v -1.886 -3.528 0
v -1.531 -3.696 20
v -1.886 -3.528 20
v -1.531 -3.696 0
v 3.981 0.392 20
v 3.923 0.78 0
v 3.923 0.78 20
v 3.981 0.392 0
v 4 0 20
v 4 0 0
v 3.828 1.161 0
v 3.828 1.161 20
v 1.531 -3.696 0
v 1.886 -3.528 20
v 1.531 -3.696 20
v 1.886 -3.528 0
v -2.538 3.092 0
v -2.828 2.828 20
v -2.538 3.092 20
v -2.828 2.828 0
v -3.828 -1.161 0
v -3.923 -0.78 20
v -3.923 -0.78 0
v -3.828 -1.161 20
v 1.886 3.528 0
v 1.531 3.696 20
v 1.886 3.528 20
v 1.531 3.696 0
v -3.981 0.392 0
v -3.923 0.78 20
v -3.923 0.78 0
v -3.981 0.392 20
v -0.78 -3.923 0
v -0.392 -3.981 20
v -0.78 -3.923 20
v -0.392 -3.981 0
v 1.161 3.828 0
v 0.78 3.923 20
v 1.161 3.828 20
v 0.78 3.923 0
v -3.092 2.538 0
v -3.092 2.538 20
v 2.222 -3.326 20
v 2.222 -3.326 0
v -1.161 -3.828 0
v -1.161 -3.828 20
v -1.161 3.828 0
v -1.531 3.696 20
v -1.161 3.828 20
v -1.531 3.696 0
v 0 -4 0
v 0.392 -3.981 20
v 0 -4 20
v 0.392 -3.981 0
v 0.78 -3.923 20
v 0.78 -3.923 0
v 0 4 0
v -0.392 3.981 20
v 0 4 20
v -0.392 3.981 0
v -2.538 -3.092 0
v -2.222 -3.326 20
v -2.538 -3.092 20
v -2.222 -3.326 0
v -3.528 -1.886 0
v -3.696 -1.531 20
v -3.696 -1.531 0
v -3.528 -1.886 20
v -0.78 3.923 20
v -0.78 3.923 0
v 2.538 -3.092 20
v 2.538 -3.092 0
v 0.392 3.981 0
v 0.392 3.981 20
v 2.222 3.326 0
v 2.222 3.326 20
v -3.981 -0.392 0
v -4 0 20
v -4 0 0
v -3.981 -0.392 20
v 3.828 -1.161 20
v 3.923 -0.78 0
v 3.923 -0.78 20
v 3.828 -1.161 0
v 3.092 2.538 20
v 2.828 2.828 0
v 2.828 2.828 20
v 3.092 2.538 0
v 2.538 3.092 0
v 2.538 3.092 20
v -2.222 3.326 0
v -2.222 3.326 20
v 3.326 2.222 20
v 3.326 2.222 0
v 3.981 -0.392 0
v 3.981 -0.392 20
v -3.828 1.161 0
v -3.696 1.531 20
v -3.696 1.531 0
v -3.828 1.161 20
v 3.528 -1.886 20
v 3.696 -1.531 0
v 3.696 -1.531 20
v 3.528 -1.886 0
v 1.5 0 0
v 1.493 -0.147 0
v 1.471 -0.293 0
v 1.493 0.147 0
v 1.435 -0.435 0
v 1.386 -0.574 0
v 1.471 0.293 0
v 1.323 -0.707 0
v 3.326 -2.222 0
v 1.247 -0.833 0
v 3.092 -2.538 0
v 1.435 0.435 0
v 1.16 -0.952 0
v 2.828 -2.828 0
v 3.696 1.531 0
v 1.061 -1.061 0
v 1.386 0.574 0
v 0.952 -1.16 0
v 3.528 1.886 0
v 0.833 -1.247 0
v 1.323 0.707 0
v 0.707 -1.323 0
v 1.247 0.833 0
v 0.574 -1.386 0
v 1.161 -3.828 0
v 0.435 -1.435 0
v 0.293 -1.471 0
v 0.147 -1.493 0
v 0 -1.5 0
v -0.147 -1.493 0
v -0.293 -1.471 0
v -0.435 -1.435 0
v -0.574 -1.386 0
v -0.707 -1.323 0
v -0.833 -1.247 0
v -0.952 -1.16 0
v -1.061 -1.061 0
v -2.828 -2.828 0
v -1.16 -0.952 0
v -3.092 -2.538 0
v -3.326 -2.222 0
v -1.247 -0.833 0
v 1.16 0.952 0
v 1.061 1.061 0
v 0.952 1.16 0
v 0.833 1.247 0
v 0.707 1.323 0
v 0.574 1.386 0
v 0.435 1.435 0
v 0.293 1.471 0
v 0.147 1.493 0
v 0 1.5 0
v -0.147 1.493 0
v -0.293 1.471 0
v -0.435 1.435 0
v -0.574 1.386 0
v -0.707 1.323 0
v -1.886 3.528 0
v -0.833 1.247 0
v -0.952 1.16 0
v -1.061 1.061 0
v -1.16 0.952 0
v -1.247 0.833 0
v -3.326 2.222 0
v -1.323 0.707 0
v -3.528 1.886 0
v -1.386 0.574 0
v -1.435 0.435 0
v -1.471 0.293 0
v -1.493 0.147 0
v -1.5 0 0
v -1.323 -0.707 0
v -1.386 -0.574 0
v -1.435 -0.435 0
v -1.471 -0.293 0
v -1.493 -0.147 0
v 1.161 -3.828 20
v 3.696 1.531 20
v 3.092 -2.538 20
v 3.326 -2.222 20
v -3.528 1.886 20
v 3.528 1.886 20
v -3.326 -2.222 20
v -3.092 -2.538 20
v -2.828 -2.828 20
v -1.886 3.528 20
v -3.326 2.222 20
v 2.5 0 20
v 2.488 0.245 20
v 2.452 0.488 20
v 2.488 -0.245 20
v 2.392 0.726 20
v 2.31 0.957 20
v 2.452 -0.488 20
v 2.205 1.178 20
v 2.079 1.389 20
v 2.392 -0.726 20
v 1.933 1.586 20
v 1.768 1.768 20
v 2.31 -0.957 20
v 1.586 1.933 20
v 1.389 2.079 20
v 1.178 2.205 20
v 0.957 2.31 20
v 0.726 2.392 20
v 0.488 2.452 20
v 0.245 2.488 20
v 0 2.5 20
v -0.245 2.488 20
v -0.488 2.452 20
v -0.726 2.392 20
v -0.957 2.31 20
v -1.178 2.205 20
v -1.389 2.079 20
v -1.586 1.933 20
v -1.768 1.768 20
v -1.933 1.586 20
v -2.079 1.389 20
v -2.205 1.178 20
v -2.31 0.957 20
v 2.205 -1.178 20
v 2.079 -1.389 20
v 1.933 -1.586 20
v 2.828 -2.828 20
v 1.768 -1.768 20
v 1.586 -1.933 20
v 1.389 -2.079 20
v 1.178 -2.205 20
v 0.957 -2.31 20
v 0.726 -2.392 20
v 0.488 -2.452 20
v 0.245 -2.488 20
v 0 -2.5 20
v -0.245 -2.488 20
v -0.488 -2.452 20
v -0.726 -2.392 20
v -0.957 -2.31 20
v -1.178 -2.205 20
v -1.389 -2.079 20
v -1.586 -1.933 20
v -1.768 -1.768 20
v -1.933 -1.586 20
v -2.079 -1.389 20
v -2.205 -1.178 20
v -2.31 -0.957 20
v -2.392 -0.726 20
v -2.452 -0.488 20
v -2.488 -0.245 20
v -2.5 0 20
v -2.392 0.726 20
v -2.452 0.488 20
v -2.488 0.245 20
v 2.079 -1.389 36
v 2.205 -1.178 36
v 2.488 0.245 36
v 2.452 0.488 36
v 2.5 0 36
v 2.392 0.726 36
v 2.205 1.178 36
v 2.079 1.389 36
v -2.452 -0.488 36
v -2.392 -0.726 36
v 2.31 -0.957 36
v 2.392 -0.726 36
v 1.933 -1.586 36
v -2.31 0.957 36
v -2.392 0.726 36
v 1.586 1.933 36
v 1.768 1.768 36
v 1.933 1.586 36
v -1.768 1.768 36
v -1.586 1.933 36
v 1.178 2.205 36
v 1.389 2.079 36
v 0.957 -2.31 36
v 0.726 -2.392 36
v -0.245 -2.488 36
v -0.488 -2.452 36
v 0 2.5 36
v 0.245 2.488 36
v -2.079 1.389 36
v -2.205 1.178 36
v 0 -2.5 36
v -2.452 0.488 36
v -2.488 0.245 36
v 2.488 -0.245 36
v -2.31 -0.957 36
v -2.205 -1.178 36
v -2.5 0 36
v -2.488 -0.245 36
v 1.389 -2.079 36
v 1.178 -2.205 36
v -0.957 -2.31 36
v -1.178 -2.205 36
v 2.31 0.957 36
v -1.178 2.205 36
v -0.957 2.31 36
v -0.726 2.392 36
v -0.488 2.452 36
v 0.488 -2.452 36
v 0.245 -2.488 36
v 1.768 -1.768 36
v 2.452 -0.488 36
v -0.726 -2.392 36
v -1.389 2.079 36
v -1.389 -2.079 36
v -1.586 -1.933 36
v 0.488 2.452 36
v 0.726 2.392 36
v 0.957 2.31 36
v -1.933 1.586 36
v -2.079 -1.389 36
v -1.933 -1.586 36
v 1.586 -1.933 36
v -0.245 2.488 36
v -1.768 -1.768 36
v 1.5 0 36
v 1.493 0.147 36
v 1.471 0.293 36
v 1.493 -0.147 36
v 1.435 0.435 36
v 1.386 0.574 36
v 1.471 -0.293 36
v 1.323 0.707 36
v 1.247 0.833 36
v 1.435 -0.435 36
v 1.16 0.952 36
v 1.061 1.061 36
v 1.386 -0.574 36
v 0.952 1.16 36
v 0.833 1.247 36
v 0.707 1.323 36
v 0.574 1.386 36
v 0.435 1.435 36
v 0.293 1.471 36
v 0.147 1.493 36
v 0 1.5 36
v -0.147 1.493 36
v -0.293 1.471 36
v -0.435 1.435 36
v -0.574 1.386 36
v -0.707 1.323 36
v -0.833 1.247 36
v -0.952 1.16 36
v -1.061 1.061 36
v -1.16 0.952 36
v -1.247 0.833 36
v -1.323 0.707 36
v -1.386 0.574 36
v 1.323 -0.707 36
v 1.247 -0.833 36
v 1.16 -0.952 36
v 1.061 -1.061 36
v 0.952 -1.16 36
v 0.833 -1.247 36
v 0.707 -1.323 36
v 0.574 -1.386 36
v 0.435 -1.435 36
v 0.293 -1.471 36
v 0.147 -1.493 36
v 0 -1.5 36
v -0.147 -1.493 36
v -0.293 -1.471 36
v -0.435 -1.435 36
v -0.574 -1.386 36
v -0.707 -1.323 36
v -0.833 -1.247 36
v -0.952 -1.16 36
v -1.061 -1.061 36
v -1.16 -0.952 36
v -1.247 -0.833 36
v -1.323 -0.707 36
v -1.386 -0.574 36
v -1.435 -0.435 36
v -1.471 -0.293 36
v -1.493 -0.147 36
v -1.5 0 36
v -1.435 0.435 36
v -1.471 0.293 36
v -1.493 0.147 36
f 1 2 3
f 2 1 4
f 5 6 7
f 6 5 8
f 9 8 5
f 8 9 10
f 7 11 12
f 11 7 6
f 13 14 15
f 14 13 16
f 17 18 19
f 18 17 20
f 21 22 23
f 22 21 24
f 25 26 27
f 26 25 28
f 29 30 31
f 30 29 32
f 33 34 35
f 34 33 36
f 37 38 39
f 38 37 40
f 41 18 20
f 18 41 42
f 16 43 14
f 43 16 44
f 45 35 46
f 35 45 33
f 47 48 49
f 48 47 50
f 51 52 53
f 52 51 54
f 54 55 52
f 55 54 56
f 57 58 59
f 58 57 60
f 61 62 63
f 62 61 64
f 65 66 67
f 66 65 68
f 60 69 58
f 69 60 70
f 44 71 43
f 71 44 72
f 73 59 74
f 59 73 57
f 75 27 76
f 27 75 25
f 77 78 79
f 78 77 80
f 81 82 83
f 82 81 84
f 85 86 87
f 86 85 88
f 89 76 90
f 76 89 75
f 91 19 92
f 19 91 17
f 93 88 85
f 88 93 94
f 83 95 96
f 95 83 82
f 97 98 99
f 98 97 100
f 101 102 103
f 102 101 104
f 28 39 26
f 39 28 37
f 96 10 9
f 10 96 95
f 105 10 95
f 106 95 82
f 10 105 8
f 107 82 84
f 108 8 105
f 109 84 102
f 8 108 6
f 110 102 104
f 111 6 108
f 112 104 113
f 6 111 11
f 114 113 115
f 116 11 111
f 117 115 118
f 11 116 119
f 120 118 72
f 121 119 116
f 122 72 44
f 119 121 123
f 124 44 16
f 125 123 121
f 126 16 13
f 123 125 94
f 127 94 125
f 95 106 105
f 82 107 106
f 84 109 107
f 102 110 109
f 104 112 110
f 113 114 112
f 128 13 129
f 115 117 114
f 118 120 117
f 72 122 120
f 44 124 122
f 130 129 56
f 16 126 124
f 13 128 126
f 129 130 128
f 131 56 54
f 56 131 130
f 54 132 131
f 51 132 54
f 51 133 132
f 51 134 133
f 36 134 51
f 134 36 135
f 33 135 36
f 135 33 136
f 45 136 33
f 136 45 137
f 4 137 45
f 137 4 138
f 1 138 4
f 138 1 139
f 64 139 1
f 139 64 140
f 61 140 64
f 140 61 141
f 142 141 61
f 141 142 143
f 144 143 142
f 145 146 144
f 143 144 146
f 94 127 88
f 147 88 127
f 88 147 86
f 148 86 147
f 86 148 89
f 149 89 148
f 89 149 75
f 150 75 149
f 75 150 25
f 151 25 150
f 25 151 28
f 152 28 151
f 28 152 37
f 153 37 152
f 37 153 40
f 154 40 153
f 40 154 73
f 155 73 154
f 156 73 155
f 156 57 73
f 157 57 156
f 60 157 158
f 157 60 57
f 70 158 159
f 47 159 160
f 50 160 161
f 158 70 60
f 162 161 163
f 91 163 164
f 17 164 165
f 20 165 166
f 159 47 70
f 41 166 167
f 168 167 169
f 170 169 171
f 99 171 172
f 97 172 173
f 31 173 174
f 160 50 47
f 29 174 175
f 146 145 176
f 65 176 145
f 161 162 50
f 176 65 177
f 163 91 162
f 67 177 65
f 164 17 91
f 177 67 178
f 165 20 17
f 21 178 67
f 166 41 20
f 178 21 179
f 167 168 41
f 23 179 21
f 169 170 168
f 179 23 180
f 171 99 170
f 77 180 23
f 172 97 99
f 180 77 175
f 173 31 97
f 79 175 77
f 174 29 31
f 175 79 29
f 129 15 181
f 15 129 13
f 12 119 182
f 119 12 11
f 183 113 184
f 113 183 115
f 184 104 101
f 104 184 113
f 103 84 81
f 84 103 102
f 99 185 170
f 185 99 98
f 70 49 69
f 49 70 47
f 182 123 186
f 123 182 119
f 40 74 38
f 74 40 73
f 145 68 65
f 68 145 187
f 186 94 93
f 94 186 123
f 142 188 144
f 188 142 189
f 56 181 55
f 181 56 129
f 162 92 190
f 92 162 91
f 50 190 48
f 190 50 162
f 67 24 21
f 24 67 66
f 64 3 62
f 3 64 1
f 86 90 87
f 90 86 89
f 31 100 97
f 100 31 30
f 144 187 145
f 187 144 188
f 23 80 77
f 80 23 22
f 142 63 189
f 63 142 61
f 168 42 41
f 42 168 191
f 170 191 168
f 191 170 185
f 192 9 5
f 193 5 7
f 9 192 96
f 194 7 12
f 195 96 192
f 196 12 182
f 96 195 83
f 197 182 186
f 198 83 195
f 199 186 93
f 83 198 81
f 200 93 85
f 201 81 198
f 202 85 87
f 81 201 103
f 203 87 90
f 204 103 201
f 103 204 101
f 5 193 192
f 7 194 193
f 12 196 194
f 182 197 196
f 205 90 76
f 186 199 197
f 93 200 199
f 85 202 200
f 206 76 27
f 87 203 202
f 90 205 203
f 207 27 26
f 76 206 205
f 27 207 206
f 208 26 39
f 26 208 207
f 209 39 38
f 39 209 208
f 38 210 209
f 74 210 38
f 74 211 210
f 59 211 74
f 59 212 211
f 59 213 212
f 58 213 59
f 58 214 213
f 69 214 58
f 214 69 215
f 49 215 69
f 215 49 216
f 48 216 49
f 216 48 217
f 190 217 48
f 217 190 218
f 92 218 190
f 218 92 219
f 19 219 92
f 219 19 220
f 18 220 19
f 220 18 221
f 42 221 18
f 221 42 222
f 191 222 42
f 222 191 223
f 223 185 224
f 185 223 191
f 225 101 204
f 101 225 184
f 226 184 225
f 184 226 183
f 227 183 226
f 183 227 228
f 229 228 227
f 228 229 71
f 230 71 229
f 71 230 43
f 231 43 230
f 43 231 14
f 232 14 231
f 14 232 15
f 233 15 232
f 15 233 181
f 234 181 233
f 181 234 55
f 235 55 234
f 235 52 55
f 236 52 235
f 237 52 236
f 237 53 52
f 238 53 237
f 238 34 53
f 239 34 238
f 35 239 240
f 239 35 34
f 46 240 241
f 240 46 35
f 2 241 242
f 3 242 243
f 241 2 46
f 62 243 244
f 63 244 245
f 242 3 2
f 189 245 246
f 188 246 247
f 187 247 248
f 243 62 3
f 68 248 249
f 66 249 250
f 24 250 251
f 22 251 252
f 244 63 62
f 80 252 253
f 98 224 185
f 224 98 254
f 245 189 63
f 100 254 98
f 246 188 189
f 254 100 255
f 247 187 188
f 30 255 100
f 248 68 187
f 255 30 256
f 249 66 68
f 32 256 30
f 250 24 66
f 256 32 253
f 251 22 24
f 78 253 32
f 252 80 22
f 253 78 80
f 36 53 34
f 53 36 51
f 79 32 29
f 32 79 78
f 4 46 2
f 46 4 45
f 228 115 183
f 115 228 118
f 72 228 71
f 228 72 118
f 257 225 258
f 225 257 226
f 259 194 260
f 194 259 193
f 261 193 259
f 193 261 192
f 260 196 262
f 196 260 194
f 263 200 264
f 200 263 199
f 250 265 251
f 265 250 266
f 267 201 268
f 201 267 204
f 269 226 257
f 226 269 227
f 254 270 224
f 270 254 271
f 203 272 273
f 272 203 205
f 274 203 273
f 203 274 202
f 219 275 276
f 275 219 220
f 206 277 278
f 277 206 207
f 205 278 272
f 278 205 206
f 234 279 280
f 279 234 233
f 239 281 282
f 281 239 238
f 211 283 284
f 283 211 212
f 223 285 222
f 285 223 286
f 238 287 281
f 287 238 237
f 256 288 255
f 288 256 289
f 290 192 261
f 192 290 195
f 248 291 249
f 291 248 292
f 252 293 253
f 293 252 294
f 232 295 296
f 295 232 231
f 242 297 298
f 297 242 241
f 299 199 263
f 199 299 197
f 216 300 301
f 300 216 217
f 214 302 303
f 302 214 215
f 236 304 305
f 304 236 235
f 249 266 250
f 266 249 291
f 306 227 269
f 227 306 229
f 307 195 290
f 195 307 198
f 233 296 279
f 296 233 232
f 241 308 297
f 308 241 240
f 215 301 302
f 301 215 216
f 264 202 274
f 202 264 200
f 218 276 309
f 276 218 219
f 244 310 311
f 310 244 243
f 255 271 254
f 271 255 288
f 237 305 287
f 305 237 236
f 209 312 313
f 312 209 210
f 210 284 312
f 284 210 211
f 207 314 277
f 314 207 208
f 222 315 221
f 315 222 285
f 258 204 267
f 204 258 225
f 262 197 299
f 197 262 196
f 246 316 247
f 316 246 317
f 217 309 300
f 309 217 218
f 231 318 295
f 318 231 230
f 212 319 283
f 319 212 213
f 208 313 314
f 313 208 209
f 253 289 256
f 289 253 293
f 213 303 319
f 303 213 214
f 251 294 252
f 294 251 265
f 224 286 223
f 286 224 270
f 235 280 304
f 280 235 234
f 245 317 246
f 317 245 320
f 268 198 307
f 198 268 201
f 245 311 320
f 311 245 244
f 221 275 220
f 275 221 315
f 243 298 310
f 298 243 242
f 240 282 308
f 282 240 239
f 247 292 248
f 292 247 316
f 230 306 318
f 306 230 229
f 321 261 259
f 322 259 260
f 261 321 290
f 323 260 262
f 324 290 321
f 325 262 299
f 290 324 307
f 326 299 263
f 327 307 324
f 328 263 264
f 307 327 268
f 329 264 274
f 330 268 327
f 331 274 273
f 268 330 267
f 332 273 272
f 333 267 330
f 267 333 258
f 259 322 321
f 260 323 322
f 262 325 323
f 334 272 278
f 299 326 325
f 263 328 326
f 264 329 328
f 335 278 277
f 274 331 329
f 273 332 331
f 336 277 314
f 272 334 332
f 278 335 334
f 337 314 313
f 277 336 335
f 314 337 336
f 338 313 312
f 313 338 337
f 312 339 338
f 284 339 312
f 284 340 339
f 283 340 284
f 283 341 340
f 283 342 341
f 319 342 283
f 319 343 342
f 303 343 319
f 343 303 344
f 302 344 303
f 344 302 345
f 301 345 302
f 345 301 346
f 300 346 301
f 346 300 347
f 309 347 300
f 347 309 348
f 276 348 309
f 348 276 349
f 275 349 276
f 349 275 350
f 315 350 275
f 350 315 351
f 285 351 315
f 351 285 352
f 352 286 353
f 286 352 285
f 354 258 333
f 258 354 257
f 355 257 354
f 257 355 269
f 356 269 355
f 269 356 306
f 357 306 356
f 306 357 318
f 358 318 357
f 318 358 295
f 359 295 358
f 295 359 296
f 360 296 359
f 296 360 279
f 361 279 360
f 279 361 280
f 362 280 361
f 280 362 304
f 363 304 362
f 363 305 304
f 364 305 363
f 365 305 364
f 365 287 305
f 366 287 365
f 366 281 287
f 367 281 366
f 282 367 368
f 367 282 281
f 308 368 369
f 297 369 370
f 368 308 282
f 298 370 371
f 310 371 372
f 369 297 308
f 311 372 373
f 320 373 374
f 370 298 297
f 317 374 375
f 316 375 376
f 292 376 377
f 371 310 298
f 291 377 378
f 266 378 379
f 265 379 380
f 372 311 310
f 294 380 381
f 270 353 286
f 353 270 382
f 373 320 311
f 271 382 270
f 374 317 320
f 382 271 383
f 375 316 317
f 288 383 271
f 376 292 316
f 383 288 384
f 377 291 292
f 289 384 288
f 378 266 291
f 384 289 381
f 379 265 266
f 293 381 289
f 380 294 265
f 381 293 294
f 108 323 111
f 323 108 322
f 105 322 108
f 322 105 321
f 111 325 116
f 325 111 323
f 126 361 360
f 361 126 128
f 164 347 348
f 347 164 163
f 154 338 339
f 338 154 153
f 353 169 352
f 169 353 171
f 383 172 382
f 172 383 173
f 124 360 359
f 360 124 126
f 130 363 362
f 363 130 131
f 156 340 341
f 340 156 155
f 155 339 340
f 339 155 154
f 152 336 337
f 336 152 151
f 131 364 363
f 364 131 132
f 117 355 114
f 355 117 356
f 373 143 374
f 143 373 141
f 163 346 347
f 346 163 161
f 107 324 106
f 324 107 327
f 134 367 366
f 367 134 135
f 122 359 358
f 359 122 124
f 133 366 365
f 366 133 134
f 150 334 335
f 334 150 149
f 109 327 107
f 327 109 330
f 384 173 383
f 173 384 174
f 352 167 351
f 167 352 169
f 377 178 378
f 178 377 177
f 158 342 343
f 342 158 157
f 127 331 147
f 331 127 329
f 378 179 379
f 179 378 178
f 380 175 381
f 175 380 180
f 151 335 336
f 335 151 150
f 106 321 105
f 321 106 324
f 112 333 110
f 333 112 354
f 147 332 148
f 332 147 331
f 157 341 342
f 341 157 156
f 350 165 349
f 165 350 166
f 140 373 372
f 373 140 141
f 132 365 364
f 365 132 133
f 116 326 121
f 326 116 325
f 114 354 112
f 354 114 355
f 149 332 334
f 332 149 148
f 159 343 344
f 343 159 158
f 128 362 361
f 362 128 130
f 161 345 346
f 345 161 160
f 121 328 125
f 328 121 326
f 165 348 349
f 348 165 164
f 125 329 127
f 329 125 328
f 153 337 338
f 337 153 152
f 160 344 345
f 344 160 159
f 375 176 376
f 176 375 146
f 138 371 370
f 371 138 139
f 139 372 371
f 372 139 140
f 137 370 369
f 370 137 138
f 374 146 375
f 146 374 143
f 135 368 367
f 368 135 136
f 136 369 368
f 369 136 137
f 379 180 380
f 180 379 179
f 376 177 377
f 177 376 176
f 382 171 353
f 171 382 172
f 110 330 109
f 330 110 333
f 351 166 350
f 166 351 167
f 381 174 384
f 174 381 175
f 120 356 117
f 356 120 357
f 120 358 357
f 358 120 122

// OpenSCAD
// Hose-barb reducer: 8 mm OD barb -> 5 mm OD barb
// Print orientation: standing upright along Z

$fn = 64;

// ---- Dimensions (mm) ----
bore      = 3;    // through-bore diameter
barb_a_d  = 8;    // outer diameter of first barb
barb_a_h  = 20;   // height of first barb
barb_b_d  = 5;    // outer diameter of second barb
barb_b_h  = 16;   // height of second barb
collar_d  = 12;   // collar diameter (see note)

// ---- Note ----
// Per the given dimensions a 12 mm collar would sit at z = 20..25,
// overlapping both barbs. The parts are modelled as stated, without
// any overlap or clearance between adjacent features.

// ---- Model ----
difference() {
    union() {
        cylinder(h = barb_a_h, d = barb_a_d);
        translate([0, 0, barb_a_h])
            cylinder(h = barb_b_h, d = barb_b_d);
    }
    // through-bore
    translate([0, 0, -1])
        cylinder(h = barb_a_h + barb_b_h + 2, d = bore);
}
